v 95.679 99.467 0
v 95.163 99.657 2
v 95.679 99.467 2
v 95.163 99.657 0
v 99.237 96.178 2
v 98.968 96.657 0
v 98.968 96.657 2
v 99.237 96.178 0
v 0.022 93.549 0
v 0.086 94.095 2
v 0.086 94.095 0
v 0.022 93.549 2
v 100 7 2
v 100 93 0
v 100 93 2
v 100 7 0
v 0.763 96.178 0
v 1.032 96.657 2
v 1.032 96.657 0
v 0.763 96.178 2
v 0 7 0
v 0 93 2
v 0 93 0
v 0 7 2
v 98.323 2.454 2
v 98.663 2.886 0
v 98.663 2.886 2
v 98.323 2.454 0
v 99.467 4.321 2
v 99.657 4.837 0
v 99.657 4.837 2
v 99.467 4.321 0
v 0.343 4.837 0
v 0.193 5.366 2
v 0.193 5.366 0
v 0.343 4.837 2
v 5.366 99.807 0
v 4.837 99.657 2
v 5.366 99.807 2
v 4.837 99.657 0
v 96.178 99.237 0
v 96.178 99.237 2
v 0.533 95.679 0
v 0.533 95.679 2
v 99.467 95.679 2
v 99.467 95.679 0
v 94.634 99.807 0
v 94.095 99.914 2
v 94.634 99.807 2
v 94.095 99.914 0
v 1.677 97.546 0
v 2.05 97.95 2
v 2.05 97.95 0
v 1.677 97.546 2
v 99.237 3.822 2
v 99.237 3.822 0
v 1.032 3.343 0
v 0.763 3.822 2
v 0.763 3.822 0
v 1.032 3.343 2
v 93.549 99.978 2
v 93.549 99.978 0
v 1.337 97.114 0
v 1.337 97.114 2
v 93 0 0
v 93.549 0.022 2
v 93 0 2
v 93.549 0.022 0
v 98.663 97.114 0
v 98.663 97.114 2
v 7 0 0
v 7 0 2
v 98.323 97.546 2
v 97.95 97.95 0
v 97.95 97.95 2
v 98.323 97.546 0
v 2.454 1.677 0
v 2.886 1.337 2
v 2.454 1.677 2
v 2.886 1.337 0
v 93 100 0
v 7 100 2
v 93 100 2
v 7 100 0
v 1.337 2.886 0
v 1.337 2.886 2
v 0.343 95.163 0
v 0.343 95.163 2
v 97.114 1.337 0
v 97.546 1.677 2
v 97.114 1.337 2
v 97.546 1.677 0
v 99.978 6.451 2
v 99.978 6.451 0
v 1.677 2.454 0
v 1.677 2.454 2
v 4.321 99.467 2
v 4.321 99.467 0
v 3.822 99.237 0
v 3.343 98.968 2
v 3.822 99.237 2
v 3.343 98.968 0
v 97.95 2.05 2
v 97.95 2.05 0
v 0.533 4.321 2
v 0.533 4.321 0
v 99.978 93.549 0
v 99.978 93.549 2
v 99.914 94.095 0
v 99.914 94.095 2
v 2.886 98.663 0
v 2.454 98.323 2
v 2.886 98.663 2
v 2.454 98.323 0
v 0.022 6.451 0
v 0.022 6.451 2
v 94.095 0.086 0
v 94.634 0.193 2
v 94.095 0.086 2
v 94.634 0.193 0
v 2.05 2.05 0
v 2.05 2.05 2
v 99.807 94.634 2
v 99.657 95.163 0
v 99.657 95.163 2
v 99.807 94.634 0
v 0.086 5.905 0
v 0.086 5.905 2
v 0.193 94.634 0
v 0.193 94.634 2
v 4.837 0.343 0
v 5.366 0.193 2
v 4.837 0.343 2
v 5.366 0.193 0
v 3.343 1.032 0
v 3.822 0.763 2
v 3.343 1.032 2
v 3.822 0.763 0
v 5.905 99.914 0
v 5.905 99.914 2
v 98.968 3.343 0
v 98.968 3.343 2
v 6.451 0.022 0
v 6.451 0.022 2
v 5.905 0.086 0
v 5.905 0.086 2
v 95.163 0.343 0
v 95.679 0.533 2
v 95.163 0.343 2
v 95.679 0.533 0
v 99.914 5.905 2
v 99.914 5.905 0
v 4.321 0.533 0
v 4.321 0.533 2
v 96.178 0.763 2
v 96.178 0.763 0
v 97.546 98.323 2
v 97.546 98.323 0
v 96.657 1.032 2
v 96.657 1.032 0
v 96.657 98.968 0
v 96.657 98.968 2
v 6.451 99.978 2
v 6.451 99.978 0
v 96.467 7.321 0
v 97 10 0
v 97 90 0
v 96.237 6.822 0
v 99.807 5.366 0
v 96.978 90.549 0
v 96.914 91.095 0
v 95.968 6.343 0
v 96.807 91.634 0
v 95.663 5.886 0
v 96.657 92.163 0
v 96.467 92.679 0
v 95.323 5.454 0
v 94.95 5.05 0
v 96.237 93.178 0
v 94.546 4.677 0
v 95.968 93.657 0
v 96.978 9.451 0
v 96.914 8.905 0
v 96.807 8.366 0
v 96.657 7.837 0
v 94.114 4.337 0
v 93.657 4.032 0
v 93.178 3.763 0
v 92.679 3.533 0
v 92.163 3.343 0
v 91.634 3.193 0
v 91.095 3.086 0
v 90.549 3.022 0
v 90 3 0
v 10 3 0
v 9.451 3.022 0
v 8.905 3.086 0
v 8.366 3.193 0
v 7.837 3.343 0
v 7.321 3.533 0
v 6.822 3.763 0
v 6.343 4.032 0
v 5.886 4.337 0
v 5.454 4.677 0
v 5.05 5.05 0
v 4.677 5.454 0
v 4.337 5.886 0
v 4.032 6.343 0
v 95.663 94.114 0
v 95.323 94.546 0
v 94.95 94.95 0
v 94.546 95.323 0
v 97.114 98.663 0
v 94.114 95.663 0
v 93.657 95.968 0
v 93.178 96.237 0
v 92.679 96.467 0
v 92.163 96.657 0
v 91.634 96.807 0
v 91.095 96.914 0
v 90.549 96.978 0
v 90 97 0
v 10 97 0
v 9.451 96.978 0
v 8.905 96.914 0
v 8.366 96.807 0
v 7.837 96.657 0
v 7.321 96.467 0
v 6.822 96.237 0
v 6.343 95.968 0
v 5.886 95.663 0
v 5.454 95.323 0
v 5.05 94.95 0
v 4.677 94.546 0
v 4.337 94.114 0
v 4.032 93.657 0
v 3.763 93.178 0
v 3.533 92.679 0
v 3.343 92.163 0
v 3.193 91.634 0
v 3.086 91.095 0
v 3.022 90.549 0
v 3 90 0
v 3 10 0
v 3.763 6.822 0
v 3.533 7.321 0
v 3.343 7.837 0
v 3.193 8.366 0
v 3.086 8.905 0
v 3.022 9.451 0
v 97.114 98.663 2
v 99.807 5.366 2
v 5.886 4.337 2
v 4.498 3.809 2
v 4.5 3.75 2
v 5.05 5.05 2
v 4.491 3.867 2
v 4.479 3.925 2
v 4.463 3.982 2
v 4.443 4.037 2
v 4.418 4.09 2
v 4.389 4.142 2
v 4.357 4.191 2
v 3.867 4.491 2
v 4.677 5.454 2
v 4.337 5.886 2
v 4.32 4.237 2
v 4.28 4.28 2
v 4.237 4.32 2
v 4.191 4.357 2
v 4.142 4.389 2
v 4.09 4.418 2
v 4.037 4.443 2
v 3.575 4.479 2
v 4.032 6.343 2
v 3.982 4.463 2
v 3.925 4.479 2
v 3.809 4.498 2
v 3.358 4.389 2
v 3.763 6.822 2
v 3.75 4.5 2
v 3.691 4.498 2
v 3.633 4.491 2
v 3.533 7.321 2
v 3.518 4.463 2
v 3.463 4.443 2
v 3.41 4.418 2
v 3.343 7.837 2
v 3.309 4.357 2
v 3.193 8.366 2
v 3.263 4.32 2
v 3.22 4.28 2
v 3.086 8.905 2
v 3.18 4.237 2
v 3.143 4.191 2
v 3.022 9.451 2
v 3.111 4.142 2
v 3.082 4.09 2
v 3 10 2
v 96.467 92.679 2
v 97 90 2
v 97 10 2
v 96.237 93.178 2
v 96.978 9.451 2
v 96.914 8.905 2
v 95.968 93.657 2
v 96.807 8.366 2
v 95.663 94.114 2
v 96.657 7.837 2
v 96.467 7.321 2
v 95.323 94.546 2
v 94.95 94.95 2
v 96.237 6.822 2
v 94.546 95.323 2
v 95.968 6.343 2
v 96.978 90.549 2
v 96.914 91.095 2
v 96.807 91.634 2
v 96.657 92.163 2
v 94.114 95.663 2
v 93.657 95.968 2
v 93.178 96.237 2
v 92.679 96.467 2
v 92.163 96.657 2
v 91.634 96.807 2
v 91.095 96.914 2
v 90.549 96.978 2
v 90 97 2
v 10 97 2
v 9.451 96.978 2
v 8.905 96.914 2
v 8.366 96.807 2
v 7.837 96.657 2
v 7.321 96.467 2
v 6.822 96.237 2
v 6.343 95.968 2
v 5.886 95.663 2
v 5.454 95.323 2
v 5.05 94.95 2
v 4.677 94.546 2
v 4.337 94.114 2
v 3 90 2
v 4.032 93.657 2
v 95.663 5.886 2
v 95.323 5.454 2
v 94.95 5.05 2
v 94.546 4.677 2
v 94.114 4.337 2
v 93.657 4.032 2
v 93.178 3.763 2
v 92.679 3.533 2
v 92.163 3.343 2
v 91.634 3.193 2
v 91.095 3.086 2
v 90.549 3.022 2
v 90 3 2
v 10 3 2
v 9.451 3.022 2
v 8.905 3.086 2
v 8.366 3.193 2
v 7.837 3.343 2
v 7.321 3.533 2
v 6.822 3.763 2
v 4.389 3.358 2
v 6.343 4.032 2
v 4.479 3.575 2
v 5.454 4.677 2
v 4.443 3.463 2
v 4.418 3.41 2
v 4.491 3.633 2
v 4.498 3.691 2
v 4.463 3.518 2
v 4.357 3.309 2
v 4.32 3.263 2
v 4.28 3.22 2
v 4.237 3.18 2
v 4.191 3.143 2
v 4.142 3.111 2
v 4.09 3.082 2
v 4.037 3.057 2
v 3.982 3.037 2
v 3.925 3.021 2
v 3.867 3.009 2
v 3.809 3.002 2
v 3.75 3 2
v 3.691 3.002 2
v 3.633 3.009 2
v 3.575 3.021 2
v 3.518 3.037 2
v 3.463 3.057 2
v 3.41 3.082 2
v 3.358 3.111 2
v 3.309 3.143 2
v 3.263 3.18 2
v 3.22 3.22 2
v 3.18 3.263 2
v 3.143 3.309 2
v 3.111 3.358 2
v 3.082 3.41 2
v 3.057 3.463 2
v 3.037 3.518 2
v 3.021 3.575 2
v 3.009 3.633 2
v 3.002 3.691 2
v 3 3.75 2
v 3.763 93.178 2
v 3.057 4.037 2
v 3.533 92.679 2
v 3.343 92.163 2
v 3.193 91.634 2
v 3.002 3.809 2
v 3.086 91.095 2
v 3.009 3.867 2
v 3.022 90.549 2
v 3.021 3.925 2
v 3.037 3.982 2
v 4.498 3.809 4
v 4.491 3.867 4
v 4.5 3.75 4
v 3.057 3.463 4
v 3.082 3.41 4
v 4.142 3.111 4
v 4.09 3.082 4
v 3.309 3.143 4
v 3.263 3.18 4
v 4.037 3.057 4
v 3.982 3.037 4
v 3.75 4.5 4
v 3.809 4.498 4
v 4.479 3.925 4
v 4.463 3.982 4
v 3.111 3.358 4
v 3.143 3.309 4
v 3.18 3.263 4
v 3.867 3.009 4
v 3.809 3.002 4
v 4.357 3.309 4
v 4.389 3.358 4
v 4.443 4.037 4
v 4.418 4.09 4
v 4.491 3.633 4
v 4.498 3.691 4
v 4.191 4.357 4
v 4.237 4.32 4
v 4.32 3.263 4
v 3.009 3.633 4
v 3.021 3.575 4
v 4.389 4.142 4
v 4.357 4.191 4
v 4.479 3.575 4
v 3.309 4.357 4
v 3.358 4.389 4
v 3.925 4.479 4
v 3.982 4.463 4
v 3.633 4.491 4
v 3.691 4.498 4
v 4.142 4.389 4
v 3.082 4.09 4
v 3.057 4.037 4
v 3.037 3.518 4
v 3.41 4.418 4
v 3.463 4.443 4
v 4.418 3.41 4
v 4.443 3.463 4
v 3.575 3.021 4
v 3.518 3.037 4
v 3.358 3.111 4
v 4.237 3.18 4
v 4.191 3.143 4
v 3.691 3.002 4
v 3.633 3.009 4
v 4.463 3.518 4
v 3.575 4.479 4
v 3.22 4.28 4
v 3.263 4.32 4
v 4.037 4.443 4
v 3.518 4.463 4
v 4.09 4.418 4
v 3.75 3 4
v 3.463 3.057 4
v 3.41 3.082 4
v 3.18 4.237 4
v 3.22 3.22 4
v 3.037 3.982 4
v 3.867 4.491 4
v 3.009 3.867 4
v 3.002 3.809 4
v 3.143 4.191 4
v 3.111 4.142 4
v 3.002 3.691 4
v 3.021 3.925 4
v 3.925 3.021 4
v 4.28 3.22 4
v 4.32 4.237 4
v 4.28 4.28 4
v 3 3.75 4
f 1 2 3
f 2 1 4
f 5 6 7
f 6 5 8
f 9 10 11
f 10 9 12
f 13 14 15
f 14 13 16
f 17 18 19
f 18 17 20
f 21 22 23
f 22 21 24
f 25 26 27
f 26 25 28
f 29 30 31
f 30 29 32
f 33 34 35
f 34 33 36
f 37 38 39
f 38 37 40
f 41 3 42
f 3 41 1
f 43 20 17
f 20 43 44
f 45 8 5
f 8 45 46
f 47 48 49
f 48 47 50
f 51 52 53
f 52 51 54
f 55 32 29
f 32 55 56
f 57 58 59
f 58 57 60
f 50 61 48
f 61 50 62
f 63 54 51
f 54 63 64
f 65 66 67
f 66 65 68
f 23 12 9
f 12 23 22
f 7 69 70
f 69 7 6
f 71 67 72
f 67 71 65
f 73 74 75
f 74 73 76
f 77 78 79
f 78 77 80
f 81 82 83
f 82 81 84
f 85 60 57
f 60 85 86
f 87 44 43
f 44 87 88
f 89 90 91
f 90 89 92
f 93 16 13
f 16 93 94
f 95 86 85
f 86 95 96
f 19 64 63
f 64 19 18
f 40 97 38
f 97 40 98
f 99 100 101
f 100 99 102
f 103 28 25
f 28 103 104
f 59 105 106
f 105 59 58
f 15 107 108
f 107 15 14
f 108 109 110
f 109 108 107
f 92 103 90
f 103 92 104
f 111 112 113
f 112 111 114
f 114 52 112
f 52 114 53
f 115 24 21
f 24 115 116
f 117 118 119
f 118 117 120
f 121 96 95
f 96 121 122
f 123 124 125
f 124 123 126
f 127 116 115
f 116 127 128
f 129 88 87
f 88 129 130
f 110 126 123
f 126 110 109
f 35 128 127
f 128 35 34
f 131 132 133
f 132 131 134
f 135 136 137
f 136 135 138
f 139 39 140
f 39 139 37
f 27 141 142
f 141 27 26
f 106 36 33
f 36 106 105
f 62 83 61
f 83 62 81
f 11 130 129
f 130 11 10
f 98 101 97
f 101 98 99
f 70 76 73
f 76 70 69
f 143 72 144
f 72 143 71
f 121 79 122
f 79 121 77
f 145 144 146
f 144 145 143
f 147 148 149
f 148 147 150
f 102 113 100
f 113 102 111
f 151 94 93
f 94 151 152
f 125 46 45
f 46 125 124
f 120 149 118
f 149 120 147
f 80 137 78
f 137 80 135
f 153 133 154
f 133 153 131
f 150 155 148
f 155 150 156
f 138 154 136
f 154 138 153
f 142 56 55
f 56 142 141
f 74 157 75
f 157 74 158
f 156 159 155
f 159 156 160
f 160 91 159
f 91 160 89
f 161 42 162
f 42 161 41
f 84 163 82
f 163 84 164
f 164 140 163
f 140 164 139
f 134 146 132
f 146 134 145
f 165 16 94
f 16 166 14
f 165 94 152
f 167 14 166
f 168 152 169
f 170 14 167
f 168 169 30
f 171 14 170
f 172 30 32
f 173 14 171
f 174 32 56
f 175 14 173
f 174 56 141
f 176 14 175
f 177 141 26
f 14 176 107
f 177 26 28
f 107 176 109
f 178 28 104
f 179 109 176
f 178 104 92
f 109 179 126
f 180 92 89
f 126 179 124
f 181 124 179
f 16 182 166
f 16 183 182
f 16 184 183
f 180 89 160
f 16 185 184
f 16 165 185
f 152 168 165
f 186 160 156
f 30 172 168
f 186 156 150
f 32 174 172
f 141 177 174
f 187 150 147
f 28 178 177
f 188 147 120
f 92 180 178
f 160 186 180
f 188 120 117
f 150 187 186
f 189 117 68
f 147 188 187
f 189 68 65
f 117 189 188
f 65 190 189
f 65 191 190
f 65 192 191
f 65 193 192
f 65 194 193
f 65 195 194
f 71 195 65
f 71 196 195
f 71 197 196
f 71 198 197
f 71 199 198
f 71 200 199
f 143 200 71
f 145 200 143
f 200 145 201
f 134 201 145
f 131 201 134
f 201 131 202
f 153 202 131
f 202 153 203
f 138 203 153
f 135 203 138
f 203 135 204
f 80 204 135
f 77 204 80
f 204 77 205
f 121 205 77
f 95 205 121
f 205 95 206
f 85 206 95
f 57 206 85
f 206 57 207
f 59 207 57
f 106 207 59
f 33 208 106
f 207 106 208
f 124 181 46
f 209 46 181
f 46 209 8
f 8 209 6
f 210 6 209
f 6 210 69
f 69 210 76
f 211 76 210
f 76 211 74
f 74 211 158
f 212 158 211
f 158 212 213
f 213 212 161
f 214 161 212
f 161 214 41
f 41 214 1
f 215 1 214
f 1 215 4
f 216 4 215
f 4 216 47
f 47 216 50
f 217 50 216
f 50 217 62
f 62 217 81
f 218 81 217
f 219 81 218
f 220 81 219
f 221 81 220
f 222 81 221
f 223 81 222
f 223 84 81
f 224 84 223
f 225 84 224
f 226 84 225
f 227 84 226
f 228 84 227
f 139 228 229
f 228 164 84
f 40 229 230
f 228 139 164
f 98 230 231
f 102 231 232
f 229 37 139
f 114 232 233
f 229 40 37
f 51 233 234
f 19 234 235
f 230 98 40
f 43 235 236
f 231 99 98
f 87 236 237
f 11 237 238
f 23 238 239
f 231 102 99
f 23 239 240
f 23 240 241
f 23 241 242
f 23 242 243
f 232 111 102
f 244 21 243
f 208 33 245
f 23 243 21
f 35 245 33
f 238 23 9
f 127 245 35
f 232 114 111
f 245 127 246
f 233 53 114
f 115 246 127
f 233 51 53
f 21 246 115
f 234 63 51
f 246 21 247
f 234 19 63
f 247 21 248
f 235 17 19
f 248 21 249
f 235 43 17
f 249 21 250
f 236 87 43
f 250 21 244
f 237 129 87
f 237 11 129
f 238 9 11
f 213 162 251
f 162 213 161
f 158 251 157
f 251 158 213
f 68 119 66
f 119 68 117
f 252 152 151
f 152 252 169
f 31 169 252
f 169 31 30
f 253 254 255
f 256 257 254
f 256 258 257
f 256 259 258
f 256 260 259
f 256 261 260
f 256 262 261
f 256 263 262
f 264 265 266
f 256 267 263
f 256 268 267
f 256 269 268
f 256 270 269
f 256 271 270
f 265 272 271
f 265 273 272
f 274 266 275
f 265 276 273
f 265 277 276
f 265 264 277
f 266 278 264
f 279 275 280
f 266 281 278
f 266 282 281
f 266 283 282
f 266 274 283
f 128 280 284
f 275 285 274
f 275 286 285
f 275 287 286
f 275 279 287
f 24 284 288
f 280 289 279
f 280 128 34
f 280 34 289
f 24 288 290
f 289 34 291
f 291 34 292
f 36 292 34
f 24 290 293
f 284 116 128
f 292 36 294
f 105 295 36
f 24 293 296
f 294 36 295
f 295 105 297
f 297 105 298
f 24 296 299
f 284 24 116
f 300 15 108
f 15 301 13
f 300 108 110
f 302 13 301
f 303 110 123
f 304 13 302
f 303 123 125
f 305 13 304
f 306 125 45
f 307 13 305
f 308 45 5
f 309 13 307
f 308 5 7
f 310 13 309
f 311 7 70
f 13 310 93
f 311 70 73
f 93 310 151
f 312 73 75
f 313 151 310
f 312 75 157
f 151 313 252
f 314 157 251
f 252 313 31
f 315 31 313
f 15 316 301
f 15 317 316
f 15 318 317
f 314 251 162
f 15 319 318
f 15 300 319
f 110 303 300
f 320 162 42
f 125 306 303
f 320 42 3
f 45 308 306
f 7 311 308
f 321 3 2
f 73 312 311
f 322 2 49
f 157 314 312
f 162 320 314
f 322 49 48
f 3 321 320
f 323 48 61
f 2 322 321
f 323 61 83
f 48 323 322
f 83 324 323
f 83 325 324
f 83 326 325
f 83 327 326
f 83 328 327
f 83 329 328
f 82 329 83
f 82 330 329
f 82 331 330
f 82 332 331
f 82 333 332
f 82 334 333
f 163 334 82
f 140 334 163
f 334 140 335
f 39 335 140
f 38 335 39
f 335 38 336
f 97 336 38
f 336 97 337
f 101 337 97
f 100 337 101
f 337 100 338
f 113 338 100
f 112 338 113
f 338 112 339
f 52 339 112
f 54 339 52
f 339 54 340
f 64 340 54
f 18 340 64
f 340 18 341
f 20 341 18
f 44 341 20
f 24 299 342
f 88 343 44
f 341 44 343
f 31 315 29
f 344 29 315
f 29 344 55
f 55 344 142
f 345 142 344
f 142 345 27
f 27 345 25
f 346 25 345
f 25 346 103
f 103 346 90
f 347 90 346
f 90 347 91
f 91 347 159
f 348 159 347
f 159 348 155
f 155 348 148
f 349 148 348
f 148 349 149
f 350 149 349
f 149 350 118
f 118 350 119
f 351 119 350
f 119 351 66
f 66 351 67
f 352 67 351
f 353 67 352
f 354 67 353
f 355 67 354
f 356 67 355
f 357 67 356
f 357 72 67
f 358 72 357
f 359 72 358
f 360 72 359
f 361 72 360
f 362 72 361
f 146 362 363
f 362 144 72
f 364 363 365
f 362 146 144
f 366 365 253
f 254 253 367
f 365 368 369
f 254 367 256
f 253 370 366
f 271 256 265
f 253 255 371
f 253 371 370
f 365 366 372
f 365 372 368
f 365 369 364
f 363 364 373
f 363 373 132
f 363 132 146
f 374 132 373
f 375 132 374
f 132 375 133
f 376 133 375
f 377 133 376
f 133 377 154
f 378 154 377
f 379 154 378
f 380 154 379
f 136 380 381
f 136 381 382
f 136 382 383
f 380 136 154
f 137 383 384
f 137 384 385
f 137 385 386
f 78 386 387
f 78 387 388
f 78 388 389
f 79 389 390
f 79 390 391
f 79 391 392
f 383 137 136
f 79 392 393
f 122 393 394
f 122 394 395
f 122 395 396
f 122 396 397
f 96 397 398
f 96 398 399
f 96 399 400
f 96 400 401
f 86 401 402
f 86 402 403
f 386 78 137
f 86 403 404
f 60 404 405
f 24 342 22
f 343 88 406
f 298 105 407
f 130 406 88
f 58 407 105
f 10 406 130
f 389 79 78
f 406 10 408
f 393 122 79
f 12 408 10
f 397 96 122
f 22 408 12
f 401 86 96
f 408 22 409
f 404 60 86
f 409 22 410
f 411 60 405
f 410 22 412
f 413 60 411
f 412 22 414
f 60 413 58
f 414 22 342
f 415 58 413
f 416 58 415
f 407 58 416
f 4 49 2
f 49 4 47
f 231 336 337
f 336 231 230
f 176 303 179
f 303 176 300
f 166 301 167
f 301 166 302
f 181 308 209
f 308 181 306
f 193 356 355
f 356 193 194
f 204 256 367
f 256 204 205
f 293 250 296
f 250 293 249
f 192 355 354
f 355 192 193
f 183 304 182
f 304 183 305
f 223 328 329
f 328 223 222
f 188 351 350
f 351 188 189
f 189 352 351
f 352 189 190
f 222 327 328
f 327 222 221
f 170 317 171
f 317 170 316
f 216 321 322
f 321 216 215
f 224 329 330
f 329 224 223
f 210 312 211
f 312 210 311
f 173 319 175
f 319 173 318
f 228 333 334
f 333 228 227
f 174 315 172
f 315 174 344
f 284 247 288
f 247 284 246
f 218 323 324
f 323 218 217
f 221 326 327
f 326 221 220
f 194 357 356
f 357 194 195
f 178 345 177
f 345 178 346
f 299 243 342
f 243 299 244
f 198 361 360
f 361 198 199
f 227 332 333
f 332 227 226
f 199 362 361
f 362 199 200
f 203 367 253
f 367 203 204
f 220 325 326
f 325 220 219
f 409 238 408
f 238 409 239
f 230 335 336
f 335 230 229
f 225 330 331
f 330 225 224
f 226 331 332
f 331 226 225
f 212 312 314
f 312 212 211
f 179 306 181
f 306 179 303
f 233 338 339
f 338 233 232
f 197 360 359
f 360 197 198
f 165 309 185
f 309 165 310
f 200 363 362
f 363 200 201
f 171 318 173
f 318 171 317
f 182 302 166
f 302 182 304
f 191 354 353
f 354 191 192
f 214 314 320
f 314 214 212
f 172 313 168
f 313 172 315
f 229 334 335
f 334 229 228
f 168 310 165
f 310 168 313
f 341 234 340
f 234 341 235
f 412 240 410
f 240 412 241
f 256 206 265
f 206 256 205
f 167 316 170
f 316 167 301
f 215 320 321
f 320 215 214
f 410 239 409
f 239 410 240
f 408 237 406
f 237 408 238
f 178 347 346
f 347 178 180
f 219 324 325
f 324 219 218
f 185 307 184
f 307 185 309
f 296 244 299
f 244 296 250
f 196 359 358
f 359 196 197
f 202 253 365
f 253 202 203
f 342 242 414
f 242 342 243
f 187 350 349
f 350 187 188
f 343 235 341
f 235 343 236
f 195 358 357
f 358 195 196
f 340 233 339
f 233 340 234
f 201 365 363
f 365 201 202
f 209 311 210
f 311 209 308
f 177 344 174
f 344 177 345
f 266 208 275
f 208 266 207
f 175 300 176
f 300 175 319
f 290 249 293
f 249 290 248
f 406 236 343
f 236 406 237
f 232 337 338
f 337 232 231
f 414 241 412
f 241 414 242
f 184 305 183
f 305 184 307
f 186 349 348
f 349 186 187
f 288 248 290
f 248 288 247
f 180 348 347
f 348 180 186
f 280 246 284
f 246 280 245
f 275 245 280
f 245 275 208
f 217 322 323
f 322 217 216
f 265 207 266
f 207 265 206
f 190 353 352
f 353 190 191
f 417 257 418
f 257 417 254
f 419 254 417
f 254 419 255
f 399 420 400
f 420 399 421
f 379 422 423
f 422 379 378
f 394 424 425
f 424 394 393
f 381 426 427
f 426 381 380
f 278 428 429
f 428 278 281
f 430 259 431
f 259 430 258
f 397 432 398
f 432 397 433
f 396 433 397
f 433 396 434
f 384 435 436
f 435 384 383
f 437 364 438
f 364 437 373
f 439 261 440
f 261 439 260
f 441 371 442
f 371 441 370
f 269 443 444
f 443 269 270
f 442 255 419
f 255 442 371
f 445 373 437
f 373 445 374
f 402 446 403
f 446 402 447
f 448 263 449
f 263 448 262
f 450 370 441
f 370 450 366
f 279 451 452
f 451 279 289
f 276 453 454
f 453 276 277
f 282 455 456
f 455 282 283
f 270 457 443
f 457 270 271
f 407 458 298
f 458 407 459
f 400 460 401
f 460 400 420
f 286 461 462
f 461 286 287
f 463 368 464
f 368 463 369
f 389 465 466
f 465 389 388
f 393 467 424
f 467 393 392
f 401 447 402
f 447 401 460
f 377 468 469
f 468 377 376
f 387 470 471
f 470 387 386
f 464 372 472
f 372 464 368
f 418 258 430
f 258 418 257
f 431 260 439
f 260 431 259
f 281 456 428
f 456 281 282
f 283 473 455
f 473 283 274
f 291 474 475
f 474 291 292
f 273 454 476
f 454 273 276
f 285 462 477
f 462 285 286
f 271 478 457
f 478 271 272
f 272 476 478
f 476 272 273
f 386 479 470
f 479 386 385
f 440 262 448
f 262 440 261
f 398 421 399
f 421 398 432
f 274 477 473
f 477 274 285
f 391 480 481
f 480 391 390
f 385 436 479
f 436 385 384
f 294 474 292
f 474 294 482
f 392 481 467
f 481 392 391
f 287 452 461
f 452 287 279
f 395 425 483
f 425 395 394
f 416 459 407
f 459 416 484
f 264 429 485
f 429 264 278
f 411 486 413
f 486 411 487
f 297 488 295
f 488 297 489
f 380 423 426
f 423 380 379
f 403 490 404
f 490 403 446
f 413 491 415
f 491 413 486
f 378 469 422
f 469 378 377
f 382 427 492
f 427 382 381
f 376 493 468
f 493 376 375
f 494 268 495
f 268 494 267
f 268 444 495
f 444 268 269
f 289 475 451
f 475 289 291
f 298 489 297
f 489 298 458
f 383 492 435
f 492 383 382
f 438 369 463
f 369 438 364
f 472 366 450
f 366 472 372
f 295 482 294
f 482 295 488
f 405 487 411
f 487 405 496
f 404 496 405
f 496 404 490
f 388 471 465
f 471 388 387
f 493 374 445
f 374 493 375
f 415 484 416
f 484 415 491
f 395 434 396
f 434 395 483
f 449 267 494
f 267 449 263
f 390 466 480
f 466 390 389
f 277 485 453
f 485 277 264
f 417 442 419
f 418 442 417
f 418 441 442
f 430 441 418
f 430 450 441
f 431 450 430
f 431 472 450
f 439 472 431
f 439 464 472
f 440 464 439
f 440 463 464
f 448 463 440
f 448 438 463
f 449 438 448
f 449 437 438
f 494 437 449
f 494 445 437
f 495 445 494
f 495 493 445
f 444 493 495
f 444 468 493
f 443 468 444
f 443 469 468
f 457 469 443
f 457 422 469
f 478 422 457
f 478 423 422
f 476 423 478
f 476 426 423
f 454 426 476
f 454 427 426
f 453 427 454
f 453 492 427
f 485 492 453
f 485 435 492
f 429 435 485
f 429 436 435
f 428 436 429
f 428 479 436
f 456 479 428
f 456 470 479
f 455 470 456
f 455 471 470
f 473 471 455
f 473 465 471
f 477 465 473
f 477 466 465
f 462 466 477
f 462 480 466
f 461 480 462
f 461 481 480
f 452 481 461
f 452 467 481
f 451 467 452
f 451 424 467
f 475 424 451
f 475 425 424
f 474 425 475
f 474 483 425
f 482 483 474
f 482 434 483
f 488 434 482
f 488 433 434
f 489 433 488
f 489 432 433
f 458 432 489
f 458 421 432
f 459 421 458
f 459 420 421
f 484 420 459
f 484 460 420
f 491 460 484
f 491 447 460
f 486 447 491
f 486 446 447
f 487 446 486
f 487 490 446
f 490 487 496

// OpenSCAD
// file: common.scad
// vim: ft=javascript

D = 1; // Small offset to avoid flush cuts
// $fa = 20;
// $fs = 0.1;
$fn = 80;

wells_x = 4;
wells_y = 4;
well_diameter = 16;
well_radius = well_diameter / 2;
well_margin = 6;

body_height = well_radius;
body_top_height = 2;
body_rim_width = 3;
body_padding = 9;
body_round_radius = 7;
body_length = 
  2 * body_padding + 
  wells_x * well_diameter + 
  (wells_x - 1) * well_margin;
body_width = 
  2 * body_padding + 
  wells_y * well_diameter + 
  (wells_y - 1) * well_margin;

lip_height = 3;


module rounded_box(size=[1, 1, 1], radius) {
  translate([radius, radius, 0]) {
    minkowski() {
      cube([size[0] - 2 * radius, size[1] - 2 * radius, size[2] - 1]);
      cylinder(h = 1, r = radius);
    }
  }
}

module body() {
    union() {
      // Body base
      rounded_box([ body_length, body_width, body_height ], body_round_radius);

      // Body top
      translate([ body_rim_width, body_rim_width, body_height - D ]) rounded_box([
        body_length - 2 * body_rim_width,
        body_width - 2 * body_rim_width,
        body_top_height + D
      ], body_round_radius);
    }
}

echo(str("### Length: ", body_length));
echo(str("### Width: ", body_width));
echo(str("### Height: ", body_height + body_top_height + lip_height));
// main file
// vim: ft=javascript

include <common.scad>;

difference() {
  rounded_box([
    body_length,
    body_width,
    body_top_height,
  ], body_round_radius);

  translate([body_rim_width, body_rim_width, -D]) rounded_box([
    body_length - 2 * body_rim_width,
    body_width - 2 * body_rim_width,
    body_top_height + 2 * D
  ], body_round_radius);
}

translate([
  1.25 * body_rim_width, 
  1.25 * body_rim_width, 
  body_top_height - D
]) cylinder(h=2 + D, r=0.75);
